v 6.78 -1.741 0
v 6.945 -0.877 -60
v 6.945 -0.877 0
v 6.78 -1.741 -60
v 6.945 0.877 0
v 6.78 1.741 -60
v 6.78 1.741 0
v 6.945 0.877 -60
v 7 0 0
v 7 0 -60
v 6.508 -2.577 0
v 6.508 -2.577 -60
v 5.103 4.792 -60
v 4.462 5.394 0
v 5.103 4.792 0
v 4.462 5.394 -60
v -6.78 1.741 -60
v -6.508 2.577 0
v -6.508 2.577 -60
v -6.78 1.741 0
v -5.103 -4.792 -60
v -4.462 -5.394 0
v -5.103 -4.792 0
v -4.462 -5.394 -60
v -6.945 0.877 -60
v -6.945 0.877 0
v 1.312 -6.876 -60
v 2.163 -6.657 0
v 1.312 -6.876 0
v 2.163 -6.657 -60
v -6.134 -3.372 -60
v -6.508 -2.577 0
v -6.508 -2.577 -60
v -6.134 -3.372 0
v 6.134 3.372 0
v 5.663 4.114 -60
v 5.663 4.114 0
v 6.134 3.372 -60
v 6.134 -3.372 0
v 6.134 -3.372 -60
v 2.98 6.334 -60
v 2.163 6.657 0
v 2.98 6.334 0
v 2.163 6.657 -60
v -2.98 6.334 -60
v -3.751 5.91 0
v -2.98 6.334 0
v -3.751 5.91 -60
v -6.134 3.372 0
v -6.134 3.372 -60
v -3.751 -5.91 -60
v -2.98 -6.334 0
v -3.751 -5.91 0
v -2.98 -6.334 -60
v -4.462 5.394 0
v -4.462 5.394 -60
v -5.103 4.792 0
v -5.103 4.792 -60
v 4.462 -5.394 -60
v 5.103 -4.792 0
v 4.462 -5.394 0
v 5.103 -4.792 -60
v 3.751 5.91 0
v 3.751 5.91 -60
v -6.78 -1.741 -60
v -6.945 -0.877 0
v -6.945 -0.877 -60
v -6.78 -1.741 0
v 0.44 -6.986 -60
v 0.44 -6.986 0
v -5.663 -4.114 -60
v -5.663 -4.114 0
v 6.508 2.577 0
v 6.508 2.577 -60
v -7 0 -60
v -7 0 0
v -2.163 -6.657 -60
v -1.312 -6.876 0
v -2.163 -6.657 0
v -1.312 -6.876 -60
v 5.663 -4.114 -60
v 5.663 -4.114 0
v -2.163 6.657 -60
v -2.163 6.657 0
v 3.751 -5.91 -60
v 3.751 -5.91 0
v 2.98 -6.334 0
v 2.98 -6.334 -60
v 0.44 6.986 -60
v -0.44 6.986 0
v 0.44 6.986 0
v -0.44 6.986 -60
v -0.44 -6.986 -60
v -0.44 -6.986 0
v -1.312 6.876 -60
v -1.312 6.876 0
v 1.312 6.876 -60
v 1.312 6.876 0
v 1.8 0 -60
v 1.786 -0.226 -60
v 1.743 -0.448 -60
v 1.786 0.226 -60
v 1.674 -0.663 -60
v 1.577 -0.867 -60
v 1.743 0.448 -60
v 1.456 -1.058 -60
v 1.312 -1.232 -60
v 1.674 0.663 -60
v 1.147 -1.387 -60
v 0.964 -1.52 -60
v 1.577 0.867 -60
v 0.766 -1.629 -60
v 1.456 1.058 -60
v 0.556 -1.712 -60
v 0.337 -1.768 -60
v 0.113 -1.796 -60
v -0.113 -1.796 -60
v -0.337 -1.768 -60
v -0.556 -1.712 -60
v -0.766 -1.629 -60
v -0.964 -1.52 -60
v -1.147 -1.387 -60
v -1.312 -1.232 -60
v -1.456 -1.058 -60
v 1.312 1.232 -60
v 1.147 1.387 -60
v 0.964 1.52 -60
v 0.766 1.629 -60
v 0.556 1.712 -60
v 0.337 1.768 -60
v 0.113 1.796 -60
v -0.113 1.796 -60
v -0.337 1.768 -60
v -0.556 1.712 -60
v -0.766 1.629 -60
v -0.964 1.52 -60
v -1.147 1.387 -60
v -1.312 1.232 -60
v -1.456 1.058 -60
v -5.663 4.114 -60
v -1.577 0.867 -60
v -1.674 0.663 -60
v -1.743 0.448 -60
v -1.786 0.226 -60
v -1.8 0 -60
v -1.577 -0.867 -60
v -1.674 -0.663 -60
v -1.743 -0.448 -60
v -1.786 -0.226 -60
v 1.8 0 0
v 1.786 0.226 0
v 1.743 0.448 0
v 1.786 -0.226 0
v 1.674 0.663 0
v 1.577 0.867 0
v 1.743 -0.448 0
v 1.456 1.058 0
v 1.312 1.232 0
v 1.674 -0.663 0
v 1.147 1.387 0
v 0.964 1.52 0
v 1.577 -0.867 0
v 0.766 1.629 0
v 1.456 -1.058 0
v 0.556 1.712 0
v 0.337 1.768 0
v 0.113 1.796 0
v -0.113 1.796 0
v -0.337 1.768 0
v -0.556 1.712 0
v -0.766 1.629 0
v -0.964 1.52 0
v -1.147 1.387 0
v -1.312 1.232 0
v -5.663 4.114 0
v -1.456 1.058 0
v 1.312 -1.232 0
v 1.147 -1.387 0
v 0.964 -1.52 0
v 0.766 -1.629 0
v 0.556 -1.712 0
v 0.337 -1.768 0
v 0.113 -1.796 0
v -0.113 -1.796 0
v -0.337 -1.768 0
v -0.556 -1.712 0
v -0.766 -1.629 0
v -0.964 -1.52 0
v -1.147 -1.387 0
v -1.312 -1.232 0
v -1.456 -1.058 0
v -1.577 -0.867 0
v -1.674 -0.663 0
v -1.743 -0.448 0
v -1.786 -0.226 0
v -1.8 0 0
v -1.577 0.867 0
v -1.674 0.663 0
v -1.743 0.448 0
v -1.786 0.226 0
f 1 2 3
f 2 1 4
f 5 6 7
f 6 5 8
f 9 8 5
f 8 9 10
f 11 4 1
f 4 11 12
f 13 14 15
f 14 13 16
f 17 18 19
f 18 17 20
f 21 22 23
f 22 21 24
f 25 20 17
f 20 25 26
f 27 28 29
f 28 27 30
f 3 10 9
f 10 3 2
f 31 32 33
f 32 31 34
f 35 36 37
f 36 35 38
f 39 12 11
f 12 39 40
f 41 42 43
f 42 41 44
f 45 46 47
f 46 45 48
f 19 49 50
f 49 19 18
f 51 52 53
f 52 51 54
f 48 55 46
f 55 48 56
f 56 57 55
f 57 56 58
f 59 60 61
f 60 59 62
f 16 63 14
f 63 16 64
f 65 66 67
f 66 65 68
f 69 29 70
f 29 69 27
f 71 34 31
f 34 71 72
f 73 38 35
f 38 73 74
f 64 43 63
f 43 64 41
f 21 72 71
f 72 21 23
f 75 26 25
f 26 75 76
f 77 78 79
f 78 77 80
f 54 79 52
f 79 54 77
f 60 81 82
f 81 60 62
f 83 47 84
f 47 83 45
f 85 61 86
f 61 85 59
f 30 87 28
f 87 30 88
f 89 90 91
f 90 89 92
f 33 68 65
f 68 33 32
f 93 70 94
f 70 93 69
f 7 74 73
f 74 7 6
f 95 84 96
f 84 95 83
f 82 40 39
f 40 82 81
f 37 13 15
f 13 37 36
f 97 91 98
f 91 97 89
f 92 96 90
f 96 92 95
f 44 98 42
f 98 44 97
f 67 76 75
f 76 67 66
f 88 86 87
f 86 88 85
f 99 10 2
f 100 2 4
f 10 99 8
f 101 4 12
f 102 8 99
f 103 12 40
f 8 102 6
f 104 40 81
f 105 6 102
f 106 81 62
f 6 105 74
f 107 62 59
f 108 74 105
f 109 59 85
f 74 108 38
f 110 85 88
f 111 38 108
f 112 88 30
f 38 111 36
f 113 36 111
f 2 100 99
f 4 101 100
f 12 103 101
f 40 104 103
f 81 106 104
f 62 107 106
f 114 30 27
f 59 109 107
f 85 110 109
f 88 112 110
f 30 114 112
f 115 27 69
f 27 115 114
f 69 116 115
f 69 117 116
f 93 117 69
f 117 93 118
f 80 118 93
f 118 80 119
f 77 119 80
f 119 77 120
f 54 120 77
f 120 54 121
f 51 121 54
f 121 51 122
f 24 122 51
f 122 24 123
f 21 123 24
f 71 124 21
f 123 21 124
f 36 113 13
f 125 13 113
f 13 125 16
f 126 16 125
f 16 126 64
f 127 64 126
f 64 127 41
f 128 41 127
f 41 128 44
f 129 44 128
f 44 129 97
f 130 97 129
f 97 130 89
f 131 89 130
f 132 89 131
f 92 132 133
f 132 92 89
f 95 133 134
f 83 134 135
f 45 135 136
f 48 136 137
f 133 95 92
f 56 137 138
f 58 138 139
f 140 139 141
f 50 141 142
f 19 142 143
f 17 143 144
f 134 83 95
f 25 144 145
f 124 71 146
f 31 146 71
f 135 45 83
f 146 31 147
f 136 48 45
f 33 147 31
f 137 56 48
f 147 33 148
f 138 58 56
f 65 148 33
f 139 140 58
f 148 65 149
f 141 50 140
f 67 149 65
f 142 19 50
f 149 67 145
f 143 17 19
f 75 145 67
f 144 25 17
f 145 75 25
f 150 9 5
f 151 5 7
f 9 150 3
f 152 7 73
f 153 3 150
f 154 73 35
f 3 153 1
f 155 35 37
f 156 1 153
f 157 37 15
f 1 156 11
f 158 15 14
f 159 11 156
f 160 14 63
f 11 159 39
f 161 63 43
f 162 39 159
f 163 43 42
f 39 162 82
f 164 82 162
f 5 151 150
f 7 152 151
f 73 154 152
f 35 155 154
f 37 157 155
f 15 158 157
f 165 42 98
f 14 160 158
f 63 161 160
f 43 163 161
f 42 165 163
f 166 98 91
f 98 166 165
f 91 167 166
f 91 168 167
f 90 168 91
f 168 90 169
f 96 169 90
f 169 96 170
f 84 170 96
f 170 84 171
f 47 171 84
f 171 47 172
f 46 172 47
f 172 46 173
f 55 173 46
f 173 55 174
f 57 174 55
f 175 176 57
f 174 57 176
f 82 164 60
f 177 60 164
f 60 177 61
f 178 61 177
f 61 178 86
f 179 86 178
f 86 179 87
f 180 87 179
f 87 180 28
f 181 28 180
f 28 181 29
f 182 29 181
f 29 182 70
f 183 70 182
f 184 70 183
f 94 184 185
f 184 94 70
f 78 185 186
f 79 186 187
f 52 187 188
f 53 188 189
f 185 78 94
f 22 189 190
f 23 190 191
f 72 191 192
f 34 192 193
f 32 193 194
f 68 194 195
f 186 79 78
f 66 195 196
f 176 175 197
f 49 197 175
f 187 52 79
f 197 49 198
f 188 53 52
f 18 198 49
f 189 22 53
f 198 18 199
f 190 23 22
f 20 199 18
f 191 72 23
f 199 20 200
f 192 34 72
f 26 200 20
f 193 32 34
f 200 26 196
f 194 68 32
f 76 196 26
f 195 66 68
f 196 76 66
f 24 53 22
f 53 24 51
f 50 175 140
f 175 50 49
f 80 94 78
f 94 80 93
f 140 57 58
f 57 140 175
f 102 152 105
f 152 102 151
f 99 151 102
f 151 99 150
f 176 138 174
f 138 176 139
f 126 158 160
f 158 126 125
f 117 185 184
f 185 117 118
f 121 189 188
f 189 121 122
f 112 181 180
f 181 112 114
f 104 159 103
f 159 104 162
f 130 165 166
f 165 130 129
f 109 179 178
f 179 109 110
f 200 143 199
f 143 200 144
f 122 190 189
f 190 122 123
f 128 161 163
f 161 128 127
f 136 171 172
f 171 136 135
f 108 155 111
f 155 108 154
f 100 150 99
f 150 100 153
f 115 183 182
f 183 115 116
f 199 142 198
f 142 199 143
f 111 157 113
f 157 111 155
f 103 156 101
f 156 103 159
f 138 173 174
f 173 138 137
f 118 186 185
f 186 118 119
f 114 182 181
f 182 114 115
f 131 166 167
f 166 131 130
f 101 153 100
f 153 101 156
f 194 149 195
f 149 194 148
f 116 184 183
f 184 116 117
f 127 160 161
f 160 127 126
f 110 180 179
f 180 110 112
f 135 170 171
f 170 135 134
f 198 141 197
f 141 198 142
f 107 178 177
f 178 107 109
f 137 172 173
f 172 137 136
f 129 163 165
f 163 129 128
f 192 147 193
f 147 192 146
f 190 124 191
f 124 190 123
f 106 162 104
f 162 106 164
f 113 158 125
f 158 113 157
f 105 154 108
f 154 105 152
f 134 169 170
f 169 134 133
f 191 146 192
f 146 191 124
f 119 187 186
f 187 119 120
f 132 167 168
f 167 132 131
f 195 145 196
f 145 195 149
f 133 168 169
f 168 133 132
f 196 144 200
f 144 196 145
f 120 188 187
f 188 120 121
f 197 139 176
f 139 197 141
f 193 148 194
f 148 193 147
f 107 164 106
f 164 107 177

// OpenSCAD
$fn = 50;


difference() {
	union() {
		translate(v = [0, 0, -60.0000000000]) {
			cylinder(h = 60, r = 7.0000000000);
		}
		cylinder(h = 0, r = 16.0000000000);
	}
	union() {
		#translate(v = [0, 0, -60]) {
			cylinder(h = 60, r = 1.8000000000);
		}
	}
}
